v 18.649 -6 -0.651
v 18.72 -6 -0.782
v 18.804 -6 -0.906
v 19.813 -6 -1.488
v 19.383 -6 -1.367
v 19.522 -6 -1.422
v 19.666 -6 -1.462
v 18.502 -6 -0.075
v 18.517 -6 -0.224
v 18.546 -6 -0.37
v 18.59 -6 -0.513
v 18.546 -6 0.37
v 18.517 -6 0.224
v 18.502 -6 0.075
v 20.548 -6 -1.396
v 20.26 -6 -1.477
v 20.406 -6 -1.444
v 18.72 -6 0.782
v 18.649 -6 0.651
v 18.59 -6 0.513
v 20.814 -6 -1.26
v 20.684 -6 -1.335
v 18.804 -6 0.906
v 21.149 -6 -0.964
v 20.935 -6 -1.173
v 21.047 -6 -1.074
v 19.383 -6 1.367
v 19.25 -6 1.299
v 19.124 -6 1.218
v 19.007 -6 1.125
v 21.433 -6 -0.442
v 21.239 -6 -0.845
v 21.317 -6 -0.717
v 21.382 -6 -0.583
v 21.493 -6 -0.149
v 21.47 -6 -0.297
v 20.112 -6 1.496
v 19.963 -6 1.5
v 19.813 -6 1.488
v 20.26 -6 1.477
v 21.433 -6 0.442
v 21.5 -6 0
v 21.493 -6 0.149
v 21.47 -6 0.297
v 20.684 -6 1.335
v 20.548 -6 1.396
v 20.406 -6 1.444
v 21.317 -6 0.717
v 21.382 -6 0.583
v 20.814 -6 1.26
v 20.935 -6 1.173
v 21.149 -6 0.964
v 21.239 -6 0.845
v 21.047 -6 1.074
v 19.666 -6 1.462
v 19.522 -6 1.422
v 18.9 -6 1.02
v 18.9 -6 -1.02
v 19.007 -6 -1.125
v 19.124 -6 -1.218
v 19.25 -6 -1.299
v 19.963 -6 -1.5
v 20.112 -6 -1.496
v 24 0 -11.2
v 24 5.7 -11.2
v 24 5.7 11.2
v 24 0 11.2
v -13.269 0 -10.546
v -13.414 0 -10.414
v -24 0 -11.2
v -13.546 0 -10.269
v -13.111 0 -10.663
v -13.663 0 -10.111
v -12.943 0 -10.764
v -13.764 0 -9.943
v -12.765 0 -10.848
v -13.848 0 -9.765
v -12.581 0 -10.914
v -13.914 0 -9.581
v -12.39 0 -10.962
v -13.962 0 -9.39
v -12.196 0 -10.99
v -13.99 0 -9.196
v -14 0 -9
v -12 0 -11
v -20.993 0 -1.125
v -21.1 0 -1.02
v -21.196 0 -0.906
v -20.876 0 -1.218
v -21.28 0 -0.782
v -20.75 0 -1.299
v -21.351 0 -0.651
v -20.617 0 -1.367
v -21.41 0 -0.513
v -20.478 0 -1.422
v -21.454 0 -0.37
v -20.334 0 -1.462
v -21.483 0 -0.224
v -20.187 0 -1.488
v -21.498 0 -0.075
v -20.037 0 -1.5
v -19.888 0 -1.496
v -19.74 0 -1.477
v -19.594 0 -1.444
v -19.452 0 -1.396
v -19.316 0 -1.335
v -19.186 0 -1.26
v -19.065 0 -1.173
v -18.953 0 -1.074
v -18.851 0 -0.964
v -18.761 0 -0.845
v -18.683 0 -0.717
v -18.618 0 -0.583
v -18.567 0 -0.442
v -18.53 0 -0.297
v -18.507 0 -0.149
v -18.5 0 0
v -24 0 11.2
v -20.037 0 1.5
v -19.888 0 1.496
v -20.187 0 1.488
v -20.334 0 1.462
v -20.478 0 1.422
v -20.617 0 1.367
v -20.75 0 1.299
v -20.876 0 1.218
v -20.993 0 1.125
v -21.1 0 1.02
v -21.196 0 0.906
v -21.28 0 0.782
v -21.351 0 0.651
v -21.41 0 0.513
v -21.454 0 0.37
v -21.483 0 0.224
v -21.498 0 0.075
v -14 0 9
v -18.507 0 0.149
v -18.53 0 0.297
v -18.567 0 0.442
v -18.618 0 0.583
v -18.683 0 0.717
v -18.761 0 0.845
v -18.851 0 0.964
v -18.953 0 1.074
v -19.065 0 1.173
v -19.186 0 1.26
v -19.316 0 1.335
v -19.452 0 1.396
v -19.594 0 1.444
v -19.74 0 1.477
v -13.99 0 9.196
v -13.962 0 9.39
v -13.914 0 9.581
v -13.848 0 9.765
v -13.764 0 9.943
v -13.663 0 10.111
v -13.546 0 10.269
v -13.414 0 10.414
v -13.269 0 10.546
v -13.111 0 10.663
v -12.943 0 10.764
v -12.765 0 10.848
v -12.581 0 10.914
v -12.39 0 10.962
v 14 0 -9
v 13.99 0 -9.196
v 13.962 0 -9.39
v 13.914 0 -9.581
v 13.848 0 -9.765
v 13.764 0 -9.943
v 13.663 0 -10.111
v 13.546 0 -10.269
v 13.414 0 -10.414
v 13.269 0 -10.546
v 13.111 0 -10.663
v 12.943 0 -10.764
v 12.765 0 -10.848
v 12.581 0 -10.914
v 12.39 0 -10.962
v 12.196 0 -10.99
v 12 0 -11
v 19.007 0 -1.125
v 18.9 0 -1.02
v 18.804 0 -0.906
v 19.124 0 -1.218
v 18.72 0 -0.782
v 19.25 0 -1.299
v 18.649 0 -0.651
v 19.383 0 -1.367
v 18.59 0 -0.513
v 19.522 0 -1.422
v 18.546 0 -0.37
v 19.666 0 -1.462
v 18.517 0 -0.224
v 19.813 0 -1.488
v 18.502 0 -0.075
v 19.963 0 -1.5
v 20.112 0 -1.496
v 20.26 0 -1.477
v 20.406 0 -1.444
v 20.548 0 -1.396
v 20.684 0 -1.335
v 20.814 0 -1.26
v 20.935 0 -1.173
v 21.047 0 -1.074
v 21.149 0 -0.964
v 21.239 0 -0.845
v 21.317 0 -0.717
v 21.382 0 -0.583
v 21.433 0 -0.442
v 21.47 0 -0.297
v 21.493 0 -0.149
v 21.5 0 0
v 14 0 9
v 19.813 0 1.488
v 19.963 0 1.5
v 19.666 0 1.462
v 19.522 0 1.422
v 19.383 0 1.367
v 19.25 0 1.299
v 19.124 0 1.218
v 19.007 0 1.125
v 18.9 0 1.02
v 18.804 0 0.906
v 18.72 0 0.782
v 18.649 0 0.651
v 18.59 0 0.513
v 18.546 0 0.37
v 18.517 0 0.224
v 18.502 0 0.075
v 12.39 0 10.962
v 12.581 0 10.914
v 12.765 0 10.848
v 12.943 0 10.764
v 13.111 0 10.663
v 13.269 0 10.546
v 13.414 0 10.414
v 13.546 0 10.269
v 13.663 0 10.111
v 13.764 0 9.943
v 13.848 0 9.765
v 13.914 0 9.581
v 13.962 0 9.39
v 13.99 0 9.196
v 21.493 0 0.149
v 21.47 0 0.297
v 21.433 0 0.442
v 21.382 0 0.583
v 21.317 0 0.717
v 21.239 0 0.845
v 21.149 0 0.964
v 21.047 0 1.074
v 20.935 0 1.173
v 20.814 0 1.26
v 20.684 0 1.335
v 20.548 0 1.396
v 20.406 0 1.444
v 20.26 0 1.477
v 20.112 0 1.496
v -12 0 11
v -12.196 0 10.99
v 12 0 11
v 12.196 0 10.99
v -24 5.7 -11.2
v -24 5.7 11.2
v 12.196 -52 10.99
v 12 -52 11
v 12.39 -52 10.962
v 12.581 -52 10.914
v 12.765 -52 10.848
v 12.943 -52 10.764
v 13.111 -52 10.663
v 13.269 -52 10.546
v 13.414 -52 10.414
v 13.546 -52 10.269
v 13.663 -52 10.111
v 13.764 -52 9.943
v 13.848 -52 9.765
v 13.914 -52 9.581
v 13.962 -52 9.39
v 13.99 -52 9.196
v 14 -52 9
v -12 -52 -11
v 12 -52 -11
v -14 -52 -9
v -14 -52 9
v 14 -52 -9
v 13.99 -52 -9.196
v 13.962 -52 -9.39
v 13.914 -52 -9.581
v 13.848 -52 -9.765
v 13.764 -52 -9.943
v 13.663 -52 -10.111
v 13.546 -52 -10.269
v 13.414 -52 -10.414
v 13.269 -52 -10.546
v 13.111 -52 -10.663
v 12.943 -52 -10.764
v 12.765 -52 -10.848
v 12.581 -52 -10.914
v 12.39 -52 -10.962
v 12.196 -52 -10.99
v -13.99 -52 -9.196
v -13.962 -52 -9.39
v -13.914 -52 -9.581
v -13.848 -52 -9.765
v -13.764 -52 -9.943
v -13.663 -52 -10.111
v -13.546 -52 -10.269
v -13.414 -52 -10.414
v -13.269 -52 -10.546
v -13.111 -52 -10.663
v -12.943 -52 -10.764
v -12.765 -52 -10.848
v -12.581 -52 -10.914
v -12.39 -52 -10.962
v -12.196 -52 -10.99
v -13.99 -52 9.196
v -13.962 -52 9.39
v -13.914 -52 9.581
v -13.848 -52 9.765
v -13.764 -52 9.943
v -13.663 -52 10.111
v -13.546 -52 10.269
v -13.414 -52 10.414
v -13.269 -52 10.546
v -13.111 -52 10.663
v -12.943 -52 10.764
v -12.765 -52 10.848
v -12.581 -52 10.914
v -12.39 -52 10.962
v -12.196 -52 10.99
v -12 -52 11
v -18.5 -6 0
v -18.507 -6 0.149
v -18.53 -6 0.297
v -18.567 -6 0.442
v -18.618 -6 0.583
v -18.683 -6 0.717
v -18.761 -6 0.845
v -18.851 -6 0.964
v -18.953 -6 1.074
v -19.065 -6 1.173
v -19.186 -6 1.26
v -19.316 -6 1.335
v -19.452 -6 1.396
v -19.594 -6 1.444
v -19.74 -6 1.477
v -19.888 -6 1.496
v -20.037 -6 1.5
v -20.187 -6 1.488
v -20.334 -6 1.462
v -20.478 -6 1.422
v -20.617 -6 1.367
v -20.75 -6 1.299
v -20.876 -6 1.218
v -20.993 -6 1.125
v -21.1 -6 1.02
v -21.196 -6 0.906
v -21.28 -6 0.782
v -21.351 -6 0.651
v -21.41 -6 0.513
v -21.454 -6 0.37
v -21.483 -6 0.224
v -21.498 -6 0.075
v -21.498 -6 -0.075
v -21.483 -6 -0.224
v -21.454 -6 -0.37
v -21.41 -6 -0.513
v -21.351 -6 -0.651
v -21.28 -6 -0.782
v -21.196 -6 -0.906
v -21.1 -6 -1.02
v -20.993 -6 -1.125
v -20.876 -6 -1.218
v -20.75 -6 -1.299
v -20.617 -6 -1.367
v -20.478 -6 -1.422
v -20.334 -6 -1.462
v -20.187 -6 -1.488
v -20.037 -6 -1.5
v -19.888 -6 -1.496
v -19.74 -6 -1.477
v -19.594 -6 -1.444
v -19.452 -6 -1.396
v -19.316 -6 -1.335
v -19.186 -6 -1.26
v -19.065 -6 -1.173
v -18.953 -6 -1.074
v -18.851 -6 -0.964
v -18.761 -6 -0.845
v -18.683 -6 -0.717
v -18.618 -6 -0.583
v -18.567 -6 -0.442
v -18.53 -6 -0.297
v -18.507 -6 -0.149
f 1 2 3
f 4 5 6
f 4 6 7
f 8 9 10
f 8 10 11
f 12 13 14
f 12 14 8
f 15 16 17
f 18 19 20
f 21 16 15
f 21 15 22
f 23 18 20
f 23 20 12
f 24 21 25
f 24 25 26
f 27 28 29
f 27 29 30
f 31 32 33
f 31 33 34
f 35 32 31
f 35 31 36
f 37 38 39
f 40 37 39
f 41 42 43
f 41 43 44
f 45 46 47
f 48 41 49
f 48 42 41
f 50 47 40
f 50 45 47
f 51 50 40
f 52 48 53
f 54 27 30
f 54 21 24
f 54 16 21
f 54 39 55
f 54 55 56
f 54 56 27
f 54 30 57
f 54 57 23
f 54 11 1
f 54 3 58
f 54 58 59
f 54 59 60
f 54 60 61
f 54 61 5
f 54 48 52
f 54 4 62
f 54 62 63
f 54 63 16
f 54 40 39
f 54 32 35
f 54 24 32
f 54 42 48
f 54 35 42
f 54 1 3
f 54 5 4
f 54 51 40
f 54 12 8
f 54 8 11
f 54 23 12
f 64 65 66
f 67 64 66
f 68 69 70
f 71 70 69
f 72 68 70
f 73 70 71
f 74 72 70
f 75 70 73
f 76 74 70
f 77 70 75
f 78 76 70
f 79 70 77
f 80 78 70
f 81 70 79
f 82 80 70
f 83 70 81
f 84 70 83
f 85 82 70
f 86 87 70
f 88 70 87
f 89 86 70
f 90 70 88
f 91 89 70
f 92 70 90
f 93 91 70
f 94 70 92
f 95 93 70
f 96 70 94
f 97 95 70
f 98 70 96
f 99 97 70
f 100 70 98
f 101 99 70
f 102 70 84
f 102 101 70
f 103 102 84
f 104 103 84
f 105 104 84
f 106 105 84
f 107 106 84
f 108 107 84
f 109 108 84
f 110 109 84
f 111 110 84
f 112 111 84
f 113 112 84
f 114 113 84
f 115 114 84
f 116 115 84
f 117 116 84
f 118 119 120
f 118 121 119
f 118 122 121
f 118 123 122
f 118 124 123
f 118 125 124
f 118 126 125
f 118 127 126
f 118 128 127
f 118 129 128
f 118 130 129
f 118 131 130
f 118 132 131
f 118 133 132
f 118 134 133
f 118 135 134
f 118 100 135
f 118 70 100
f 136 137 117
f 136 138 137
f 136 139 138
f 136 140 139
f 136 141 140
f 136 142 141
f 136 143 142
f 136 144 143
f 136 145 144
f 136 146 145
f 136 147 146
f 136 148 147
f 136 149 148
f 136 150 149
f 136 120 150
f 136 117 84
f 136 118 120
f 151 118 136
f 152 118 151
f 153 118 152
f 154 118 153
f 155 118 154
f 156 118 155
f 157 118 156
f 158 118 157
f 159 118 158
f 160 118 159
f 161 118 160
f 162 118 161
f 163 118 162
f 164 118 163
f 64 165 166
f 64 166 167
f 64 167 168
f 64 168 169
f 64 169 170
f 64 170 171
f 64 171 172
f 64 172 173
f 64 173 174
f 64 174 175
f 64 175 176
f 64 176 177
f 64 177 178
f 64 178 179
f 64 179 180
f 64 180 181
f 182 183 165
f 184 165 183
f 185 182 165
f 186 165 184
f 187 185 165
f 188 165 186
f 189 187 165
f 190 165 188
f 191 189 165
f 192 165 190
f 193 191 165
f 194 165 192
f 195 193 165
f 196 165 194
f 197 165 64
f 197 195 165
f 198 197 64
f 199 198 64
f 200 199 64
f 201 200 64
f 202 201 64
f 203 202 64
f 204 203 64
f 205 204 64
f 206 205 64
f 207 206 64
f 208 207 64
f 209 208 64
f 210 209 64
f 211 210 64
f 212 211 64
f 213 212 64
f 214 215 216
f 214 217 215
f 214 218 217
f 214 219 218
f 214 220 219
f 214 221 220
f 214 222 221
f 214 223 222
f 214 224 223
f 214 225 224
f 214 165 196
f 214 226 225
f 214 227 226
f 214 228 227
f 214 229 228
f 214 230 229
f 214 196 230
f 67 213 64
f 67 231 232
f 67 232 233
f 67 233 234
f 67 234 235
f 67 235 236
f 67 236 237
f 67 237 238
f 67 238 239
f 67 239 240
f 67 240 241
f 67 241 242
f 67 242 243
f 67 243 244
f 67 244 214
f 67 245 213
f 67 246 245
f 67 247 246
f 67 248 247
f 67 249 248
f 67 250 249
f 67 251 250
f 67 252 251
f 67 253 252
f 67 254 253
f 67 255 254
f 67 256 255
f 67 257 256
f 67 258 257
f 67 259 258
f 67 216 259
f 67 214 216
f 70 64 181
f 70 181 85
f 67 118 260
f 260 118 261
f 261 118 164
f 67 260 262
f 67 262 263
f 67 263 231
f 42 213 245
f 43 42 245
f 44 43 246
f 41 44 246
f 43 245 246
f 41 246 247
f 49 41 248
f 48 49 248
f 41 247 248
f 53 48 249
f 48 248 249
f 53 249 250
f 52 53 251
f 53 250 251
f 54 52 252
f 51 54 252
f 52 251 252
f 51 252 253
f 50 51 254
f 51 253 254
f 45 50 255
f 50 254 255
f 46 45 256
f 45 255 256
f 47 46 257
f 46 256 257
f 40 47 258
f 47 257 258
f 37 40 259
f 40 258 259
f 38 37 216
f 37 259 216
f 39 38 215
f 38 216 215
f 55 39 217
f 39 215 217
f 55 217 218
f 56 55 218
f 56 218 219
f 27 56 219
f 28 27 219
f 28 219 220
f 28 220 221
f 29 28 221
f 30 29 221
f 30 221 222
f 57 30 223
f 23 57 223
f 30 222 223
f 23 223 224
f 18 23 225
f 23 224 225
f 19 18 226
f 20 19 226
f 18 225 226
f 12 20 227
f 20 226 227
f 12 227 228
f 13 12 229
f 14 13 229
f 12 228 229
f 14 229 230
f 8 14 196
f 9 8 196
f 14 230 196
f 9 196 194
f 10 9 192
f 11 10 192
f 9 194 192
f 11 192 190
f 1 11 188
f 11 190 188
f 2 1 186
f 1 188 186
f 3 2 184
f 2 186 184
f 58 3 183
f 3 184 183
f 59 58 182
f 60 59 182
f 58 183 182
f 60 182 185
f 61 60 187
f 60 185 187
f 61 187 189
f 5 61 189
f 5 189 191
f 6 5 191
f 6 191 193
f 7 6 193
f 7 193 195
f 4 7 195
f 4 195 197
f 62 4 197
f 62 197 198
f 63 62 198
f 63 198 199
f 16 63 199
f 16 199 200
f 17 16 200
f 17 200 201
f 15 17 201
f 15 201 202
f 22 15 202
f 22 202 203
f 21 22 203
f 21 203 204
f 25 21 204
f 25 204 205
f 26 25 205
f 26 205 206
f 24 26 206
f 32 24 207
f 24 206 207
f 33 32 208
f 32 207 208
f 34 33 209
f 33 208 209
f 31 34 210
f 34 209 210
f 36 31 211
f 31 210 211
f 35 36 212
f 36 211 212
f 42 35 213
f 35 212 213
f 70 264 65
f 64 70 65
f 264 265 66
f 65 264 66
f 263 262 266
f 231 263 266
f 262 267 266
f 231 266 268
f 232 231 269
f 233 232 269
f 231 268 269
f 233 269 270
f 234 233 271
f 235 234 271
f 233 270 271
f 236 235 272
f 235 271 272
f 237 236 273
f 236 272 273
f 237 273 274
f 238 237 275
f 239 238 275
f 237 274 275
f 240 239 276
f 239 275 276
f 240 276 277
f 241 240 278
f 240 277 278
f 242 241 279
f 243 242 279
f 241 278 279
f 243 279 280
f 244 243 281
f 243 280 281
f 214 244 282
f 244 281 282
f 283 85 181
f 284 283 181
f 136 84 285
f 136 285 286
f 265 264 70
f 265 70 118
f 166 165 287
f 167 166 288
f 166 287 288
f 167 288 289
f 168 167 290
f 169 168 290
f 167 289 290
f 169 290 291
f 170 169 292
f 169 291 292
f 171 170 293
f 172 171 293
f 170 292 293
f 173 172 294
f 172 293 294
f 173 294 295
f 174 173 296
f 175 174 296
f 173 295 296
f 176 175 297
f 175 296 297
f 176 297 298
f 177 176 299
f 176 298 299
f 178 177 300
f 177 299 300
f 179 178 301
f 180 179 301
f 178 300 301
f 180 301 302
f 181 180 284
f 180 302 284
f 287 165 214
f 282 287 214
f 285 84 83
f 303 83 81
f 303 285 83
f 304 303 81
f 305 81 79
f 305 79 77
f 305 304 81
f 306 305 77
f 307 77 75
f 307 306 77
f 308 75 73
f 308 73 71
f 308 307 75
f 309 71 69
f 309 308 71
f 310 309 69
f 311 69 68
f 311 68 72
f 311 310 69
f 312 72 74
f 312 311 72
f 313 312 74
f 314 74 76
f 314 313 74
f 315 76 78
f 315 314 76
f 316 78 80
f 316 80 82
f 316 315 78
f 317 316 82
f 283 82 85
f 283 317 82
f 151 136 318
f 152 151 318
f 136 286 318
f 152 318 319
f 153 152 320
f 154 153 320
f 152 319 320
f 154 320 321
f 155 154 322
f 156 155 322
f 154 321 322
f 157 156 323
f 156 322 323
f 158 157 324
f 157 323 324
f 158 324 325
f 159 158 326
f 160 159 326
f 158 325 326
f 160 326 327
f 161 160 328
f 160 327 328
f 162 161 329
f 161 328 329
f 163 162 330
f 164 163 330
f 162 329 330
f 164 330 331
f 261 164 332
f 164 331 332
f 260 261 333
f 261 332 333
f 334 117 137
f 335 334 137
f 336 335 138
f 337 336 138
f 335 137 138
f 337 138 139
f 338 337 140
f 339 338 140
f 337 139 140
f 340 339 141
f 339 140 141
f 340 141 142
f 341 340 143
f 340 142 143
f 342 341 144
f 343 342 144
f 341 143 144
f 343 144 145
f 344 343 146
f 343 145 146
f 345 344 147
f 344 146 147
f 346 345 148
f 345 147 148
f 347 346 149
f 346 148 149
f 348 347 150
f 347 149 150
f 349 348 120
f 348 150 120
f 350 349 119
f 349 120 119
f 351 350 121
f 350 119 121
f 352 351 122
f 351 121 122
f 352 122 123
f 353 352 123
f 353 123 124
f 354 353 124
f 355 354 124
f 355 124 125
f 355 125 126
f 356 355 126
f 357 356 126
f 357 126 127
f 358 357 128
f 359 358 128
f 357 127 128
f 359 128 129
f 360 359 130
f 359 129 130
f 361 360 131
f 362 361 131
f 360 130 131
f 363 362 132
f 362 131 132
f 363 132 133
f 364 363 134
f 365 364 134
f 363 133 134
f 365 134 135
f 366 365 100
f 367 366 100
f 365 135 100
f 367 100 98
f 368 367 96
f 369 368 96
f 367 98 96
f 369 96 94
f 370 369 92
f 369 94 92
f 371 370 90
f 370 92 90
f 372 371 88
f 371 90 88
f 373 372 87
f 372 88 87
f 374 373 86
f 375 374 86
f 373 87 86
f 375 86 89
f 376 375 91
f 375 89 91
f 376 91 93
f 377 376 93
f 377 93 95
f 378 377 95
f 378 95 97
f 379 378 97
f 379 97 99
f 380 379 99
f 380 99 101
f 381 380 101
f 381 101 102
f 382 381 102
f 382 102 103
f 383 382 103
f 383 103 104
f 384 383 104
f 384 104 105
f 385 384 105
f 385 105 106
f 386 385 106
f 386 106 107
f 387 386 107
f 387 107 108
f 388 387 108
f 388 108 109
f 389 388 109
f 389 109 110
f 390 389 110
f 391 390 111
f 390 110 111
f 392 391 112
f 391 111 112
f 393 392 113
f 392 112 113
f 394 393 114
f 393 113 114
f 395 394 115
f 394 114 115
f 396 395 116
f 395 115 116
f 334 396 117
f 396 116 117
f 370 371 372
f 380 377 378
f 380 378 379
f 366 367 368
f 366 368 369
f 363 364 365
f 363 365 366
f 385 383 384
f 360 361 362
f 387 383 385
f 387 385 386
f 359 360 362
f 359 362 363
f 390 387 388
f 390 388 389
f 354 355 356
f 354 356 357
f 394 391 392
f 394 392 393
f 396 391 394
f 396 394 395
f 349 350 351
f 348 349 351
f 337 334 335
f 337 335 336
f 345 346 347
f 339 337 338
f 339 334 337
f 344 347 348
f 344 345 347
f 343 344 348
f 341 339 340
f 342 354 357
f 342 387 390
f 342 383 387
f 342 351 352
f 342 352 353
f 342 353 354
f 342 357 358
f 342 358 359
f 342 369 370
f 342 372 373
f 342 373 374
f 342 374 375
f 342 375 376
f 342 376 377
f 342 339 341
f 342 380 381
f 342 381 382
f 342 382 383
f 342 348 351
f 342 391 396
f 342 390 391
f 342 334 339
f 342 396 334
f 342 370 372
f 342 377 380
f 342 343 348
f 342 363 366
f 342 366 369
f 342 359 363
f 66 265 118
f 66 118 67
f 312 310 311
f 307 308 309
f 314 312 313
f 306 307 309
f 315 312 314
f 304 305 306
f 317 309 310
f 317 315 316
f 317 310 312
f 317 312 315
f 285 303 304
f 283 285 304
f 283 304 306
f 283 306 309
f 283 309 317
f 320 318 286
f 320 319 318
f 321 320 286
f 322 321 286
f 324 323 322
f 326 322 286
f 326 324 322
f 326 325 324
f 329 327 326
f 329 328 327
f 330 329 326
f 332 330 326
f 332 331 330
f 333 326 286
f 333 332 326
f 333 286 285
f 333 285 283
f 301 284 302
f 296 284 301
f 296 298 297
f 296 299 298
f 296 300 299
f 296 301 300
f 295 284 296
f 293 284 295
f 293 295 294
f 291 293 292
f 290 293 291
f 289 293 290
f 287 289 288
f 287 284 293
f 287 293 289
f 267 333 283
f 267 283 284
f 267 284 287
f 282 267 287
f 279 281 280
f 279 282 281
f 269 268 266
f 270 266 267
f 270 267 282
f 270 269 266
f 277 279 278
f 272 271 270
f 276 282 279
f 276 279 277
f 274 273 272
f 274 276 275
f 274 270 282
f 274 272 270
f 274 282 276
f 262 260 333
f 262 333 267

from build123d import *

# Parameters (mm, degrees)
SKETCH_W          = 28
SKETCH_H          = 22
PAD_DEPTH         = 52
FILLET_R          = 2
FILLET001_R       = 2
FILLET002_R       = 2
FILLET003_R       = 2
BOX_W             = 48
BOX_H             = 22.4
BOX_DEPTH         = 5.7
CYLINDER_R        = 1.5
CYLINDER_DEPTH    = 6
CYLINDER001_R     = 1.5
CYLINDER001_DEPTH = 6


with BuildPart() as part:
    # Sketch → Pad (new body)
    with BuildSketch(Plane.XZ):
        Rectangle(SKETCH_W, SKETCH_H)
    extrude(amount=PAD_DEPTH)

    # Fillet
    fillet_edges = [part.edges().sort_by_distance(p)[0] for p in [
        (-14, -26, 11),
    ]]
    fillet(fillet_edges, radius=FILLET_R)

    # Fillet001
    fillet001_edges = [part.edges().sort_by_distance(p)[0] for p in [
        (-14, -26, -11),
    ]]
    fillet(fillet001_edges, radius=FILLET001_R)

    # Fillet002
    fillet002_edges = [part.edges().sort_by_distance(p)[0] for p in [
        (14, -26, 11),
    ]]
    fillet(fillet002_edges, radius=FILLET002_R)

    # Fillet003
    fillet003_edges = [part.edges().sort_by_distance(p)[0] for p in [
        (14, -26, -11),
    ]]
    fillet(fillet003_edges, radius=FILLET003_R)

    # Box → Box (join)
    with BuildSketch(Plane(origin=(-24, 5.7, -11.2), x_dir=(1, 0, 0), z_dir=(0, -1, 0))):
        with Locations((24, 11.2)):
            Rectangle(BOX_W, BOX_H)
    extrude(amount=BOX_DEPTH)

    # Cylinder → Cylinder (join)
    with BuildSketch(Plane(origin=(-20, 0, 0), x_dir=(1, 0, 0), z_dir=(0, -1, 0))):
        Circle(CYLINDER_R)
    extrude(amount=CYLINDER_DEPTH)

    # Cylinder001 → Cylinder001 (join)
    with BuildSketch(Plane(origin=(20, 0, 0), x_dir=(1, 0, 0), z_dir=(0, -1, 0))):
        Circle(CYLINDER001_R)
    extrude(amount=CYLINDER001_DEPTH)


solid = part.part
